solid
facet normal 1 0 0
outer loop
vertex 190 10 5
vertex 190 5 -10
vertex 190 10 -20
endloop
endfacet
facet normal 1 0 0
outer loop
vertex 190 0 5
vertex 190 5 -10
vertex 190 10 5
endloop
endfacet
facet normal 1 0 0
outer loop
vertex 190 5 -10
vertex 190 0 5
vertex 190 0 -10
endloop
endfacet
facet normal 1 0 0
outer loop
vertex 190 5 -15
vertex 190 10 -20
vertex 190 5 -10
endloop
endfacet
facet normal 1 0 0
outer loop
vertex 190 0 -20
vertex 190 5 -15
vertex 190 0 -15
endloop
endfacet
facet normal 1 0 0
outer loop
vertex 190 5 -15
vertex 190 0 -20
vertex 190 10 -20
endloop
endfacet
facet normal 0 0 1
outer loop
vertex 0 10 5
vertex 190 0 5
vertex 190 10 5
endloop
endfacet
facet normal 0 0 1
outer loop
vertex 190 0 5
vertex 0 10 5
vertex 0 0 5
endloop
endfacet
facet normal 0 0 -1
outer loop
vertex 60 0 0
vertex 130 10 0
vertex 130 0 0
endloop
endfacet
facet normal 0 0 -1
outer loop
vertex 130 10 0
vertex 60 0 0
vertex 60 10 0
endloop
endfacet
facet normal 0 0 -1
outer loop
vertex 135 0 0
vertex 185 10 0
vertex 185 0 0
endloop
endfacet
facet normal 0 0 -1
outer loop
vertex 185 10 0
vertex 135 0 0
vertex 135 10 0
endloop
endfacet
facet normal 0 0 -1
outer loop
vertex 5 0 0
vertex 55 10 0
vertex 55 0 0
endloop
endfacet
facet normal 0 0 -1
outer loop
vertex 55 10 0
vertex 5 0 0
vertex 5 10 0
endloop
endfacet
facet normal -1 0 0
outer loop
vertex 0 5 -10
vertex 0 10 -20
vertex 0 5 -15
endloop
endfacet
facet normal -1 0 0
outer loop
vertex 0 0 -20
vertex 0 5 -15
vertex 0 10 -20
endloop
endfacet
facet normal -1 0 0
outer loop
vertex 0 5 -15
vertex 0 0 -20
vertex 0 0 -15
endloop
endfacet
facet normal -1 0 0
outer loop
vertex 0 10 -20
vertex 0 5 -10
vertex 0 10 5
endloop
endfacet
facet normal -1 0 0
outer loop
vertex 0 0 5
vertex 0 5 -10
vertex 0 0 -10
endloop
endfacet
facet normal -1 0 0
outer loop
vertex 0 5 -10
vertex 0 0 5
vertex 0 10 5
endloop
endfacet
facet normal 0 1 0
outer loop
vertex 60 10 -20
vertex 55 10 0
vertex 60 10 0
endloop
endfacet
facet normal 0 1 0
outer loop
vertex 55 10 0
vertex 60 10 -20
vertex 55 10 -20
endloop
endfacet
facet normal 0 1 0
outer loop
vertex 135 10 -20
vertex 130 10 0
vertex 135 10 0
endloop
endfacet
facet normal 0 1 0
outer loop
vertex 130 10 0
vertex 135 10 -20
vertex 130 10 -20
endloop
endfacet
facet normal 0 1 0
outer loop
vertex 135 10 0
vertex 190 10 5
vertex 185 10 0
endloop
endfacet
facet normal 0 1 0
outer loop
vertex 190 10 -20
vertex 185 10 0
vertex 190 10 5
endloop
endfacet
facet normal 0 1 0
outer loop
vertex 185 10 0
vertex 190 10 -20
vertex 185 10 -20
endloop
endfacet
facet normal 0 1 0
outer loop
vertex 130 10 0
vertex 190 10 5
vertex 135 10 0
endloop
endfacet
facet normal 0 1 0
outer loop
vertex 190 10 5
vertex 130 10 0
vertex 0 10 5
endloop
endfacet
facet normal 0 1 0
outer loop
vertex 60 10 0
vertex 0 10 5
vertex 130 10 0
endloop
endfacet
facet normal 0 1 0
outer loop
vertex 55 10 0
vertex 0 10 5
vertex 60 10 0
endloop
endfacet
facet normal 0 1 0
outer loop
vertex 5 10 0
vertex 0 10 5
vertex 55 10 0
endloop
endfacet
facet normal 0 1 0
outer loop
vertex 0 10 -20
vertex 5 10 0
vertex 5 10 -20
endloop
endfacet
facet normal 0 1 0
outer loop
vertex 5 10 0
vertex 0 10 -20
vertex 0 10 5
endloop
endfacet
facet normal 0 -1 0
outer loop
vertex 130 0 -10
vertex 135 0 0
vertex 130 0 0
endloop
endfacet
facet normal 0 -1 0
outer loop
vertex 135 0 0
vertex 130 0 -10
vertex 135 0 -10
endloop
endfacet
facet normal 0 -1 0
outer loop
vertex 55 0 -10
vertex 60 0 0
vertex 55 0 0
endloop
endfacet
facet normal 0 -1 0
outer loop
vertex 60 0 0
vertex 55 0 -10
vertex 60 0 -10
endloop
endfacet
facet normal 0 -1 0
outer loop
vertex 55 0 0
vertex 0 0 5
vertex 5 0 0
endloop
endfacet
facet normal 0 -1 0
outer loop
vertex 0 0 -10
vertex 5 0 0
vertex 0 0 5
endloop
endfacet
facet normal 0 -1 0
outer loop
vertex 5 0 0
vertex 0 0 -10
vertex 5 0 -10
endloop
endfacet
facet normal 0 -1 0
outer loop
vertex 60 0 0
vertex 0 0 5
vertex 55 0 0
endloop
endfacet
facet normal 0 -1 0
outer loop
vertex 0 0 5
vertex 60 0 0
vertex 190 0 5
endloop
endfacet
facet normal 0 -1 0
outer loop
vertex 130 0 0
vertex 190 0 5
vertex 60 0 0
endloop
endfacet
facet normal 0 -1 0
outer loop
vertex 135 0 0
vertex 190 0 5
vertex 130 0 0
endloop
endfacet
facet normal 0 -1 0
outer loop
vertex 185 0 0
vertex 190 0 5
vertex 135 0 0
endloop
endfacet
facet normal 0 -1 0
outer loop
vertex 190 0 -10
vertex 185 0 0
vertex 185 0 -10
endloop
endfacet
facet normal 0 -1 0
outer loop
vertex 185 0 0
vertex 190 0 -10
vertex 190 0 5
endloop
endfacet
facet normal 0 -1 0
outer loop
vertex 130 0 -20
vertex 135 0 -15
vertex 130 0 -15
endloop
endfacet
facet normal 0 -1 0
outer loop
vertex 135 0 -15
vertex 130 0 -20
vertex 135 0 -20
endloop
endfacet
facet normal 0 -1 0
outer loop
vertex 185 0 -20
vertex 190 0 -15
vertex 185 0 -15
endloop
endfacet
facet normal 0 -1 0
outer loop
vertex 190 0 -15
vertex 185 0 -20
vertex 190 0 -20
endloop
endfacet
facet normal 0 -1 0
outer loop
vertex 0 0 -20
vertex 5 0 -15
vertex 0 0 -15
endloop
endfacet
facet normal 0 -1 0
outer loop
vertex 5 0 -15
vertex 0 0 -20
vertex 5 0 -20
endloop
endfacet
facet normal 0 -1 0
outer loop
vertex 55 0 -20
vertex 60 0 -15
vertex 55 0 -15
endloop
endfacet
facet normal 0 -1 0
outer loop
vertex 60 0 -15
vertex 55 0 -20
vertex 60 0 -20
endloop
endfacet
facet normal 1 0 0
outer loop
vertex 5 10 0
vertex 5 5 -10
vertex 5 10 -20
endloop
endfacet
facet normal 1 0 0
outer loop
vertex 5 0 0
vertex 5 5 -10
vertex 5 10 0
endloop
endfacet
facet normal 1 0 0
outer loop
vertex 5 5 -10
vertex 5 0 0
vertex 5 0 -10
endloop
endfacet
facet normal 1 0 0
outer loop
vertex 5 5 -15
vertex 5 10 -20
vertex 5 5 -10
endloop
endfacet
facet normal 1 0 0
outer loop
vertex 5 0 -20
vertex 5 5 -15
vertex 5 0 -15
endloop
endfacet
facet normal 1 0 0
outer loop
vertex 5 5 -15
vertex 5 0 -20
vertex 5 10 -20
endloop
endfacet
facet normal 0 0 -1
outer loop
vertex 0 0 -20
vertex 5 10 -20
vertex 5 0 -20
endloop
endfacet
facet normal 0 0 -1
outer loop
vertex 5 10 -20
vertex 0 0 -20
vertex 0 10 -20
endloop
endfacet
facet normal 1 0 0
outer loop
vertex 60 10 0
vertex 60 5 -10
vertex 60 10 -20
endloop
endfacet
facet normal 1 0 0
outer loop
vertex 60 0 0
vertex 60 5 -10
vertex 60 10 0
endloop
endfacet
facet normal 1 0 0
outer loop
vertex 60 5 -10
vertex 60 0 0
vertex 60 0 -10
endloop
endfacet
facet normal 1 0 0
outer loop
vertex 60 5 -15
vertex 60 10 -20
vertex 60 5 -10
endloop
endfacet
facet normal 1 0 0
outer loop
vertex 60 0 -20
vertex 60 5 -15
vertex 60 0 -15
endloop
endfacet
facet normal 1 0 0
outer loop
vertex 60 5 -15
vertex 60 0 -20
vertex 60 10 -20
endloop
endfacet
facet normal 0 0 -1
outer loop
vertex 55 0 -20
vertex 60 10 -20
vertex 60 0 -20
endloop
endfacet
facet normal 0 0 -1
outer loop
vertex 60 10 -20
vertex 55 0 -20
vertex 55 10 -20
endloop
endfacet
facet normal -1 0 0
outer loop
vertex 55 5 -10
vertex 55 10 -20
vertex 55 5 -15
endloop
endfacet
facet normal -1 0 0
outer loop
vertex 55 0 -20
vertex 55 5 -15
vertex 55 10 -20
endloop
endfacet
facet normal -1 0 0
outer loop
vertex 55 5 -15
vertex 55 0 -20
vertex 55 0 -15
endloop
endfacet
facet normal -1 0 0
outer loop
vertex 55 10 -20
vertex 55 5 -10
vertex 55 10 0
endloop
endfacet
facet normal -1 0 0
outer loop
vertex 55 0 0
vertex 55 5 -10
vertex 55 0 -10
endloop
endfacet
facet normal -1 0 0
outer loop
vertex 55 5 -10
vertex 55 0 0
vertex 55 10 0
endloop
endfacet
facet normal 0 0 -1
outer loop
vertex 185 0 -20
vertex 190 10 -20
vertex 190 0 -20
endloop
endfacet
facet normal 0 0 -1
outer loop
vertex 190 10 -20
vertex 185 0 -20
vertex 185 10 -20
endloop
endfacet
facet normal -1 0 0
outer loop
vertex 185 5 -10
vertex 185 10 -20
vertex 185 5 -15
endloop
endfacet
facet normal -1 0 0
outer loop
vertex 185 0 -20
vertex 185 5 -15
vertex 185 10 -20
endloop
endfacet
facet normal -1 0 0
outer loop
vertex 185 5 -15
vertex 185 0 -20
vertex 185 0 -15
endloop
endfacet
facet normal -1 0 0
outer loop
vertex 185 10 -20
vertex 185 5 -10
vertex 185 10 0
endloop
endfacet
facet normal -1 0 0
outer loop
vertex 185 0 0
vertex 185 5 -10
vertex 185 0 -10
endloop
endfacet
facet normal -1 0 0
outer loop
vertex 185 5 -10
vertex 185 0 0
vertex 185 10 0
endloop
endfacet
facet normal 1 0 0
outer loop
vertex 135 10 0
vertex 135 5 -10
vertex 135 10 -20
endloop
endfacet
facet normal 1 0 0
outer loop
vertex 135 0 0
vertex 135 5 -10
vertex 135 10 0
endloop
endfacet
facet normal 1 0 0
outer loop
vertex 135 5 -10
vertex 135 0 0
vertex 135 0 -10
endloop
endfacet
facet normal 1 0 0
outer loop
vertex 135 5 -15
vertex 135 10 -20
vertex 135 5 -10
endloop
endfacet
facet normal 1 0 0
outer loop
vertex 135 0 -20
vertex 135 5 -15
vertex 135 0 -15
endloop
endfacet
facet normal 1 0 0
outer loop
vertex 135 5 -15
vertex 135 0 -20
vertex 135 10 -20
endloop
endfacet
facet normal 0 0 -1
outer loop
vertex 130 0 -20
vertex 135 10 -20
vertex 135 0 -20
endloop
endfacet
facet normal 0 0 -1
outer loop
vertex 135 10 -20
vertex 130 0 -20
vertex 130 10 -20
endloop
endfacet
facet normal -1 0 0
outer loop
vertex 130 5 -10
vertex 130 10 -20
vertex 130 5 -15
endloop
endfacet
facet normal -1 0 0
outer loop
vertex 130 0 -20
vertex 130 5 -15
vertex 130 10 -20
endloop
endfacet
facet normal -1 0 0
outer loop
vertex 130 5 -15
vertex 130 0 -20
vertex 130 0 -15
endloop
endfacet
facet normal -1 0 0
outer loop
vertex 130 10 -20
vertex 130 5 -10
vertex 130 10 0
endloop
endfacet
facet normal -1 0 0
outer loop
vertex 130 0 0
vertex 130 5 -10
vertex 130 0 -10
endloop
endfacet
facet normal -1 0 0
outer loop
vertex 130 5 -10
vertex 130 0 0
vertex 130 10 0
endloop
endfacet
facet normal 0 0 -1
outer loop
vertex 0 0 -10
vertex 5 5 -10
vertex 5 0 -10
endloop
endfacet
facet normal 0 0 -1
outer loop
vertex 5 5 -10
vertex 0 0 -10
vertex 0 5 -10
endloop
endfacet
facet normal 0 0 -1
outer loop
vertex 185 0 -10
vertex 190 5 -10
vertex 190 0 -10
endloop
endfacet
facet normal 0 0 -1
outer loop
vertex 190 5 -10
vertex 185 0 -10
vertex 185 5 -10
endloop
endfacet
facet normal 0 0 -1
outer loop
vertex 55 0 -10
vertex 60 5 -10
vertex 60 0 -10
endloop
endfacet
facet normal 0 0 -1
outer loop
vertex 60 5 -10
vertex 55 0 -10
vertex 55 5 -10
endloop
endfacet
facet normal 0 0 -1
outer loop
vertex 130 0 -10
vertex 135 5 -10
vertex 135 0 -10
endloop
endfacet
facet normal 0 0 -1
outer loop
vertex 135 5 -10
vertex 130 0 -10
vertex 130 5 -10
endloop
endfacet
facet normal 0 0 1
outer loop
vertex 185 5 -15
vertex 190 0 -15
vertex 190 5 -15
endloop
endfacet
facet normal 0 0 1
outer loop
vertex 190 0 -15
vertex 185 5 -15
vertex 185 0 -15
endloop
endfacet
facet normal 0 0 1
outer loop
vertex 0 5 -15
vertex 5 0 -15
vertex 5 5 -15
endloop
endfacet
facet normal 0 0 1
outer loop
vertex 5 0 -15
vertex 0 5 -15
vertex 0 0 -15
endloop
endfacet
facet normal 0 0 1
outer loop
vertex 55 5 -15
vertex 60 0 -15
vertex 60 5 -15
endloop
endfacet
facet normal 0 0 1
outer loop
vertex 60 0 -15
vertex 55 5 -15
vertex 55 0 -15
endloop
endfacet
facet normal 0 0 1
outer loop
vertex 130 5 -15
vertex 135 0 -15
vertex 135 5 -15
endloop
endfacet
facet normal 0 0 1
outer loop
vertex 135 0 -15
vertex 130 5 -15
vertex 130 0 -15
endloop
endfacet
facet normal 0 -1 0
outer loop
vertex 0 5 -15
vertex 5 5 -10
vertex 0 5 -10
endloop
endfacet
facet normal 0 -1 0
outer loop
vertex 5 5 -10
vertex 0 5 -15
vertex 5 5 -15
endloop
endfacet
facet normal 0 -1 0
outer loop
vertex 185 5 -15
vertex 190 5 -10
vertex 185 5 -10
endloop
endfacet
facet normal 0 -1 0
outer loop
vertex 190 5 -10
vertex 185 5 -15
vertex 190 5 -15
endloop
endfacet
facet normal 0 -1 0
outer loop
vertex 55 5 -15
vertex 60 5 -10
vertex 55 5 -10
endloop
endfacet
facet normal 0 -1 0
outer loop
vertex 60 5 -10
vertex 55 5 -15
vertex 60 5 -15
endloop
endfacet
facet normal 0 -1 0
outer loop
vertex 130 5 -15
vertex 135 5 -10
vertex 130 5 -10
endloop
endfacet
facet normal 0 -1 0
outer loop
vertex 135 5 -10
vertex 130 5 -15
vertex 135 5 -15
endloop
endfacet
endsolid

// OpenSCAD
// wooden part
/// width = 50
/// distance between = 70
/// height = 11.2

// metal frame
/// width = 32
/// height = 4.5

// update v2 
/// half width, less height, bigger jaws

totalLength = 10 + 50 + 10 + 50 + 10 + 50 + 10;
woodDepth = 12;
cutout = 5;
legDepth = 10 + cutout*2;

difference() {
    union() {
        /*intersection() {
            translate([0, 10/2, 0])
                rotate([0, 90, 0])
                    cylinder(totalLength, 10/2, 10/2);*/
            
            cube([10 + 50 + 10 + 50 + 10 + 50 + 10, 10, 5]);
        /*}*/

        translate([0, 0, -legDepth])
            cube([5, 10, legDepth]);
            
        translate([50 + 5, 0, -legDepth])
            cube([5, 10, legDepth]);
            
        translate([totalLength-5, 0, -legDepth])
            cube([5, 10, legDepth]);
            
        translate([totalLength-5-50-5, 0, -legDepth])
            cube([5, 10, legDepth]);
    }
        
    translate([0, 0, -legDepth+cutout])
        cube([totalLength, 5, cutout]);
}
